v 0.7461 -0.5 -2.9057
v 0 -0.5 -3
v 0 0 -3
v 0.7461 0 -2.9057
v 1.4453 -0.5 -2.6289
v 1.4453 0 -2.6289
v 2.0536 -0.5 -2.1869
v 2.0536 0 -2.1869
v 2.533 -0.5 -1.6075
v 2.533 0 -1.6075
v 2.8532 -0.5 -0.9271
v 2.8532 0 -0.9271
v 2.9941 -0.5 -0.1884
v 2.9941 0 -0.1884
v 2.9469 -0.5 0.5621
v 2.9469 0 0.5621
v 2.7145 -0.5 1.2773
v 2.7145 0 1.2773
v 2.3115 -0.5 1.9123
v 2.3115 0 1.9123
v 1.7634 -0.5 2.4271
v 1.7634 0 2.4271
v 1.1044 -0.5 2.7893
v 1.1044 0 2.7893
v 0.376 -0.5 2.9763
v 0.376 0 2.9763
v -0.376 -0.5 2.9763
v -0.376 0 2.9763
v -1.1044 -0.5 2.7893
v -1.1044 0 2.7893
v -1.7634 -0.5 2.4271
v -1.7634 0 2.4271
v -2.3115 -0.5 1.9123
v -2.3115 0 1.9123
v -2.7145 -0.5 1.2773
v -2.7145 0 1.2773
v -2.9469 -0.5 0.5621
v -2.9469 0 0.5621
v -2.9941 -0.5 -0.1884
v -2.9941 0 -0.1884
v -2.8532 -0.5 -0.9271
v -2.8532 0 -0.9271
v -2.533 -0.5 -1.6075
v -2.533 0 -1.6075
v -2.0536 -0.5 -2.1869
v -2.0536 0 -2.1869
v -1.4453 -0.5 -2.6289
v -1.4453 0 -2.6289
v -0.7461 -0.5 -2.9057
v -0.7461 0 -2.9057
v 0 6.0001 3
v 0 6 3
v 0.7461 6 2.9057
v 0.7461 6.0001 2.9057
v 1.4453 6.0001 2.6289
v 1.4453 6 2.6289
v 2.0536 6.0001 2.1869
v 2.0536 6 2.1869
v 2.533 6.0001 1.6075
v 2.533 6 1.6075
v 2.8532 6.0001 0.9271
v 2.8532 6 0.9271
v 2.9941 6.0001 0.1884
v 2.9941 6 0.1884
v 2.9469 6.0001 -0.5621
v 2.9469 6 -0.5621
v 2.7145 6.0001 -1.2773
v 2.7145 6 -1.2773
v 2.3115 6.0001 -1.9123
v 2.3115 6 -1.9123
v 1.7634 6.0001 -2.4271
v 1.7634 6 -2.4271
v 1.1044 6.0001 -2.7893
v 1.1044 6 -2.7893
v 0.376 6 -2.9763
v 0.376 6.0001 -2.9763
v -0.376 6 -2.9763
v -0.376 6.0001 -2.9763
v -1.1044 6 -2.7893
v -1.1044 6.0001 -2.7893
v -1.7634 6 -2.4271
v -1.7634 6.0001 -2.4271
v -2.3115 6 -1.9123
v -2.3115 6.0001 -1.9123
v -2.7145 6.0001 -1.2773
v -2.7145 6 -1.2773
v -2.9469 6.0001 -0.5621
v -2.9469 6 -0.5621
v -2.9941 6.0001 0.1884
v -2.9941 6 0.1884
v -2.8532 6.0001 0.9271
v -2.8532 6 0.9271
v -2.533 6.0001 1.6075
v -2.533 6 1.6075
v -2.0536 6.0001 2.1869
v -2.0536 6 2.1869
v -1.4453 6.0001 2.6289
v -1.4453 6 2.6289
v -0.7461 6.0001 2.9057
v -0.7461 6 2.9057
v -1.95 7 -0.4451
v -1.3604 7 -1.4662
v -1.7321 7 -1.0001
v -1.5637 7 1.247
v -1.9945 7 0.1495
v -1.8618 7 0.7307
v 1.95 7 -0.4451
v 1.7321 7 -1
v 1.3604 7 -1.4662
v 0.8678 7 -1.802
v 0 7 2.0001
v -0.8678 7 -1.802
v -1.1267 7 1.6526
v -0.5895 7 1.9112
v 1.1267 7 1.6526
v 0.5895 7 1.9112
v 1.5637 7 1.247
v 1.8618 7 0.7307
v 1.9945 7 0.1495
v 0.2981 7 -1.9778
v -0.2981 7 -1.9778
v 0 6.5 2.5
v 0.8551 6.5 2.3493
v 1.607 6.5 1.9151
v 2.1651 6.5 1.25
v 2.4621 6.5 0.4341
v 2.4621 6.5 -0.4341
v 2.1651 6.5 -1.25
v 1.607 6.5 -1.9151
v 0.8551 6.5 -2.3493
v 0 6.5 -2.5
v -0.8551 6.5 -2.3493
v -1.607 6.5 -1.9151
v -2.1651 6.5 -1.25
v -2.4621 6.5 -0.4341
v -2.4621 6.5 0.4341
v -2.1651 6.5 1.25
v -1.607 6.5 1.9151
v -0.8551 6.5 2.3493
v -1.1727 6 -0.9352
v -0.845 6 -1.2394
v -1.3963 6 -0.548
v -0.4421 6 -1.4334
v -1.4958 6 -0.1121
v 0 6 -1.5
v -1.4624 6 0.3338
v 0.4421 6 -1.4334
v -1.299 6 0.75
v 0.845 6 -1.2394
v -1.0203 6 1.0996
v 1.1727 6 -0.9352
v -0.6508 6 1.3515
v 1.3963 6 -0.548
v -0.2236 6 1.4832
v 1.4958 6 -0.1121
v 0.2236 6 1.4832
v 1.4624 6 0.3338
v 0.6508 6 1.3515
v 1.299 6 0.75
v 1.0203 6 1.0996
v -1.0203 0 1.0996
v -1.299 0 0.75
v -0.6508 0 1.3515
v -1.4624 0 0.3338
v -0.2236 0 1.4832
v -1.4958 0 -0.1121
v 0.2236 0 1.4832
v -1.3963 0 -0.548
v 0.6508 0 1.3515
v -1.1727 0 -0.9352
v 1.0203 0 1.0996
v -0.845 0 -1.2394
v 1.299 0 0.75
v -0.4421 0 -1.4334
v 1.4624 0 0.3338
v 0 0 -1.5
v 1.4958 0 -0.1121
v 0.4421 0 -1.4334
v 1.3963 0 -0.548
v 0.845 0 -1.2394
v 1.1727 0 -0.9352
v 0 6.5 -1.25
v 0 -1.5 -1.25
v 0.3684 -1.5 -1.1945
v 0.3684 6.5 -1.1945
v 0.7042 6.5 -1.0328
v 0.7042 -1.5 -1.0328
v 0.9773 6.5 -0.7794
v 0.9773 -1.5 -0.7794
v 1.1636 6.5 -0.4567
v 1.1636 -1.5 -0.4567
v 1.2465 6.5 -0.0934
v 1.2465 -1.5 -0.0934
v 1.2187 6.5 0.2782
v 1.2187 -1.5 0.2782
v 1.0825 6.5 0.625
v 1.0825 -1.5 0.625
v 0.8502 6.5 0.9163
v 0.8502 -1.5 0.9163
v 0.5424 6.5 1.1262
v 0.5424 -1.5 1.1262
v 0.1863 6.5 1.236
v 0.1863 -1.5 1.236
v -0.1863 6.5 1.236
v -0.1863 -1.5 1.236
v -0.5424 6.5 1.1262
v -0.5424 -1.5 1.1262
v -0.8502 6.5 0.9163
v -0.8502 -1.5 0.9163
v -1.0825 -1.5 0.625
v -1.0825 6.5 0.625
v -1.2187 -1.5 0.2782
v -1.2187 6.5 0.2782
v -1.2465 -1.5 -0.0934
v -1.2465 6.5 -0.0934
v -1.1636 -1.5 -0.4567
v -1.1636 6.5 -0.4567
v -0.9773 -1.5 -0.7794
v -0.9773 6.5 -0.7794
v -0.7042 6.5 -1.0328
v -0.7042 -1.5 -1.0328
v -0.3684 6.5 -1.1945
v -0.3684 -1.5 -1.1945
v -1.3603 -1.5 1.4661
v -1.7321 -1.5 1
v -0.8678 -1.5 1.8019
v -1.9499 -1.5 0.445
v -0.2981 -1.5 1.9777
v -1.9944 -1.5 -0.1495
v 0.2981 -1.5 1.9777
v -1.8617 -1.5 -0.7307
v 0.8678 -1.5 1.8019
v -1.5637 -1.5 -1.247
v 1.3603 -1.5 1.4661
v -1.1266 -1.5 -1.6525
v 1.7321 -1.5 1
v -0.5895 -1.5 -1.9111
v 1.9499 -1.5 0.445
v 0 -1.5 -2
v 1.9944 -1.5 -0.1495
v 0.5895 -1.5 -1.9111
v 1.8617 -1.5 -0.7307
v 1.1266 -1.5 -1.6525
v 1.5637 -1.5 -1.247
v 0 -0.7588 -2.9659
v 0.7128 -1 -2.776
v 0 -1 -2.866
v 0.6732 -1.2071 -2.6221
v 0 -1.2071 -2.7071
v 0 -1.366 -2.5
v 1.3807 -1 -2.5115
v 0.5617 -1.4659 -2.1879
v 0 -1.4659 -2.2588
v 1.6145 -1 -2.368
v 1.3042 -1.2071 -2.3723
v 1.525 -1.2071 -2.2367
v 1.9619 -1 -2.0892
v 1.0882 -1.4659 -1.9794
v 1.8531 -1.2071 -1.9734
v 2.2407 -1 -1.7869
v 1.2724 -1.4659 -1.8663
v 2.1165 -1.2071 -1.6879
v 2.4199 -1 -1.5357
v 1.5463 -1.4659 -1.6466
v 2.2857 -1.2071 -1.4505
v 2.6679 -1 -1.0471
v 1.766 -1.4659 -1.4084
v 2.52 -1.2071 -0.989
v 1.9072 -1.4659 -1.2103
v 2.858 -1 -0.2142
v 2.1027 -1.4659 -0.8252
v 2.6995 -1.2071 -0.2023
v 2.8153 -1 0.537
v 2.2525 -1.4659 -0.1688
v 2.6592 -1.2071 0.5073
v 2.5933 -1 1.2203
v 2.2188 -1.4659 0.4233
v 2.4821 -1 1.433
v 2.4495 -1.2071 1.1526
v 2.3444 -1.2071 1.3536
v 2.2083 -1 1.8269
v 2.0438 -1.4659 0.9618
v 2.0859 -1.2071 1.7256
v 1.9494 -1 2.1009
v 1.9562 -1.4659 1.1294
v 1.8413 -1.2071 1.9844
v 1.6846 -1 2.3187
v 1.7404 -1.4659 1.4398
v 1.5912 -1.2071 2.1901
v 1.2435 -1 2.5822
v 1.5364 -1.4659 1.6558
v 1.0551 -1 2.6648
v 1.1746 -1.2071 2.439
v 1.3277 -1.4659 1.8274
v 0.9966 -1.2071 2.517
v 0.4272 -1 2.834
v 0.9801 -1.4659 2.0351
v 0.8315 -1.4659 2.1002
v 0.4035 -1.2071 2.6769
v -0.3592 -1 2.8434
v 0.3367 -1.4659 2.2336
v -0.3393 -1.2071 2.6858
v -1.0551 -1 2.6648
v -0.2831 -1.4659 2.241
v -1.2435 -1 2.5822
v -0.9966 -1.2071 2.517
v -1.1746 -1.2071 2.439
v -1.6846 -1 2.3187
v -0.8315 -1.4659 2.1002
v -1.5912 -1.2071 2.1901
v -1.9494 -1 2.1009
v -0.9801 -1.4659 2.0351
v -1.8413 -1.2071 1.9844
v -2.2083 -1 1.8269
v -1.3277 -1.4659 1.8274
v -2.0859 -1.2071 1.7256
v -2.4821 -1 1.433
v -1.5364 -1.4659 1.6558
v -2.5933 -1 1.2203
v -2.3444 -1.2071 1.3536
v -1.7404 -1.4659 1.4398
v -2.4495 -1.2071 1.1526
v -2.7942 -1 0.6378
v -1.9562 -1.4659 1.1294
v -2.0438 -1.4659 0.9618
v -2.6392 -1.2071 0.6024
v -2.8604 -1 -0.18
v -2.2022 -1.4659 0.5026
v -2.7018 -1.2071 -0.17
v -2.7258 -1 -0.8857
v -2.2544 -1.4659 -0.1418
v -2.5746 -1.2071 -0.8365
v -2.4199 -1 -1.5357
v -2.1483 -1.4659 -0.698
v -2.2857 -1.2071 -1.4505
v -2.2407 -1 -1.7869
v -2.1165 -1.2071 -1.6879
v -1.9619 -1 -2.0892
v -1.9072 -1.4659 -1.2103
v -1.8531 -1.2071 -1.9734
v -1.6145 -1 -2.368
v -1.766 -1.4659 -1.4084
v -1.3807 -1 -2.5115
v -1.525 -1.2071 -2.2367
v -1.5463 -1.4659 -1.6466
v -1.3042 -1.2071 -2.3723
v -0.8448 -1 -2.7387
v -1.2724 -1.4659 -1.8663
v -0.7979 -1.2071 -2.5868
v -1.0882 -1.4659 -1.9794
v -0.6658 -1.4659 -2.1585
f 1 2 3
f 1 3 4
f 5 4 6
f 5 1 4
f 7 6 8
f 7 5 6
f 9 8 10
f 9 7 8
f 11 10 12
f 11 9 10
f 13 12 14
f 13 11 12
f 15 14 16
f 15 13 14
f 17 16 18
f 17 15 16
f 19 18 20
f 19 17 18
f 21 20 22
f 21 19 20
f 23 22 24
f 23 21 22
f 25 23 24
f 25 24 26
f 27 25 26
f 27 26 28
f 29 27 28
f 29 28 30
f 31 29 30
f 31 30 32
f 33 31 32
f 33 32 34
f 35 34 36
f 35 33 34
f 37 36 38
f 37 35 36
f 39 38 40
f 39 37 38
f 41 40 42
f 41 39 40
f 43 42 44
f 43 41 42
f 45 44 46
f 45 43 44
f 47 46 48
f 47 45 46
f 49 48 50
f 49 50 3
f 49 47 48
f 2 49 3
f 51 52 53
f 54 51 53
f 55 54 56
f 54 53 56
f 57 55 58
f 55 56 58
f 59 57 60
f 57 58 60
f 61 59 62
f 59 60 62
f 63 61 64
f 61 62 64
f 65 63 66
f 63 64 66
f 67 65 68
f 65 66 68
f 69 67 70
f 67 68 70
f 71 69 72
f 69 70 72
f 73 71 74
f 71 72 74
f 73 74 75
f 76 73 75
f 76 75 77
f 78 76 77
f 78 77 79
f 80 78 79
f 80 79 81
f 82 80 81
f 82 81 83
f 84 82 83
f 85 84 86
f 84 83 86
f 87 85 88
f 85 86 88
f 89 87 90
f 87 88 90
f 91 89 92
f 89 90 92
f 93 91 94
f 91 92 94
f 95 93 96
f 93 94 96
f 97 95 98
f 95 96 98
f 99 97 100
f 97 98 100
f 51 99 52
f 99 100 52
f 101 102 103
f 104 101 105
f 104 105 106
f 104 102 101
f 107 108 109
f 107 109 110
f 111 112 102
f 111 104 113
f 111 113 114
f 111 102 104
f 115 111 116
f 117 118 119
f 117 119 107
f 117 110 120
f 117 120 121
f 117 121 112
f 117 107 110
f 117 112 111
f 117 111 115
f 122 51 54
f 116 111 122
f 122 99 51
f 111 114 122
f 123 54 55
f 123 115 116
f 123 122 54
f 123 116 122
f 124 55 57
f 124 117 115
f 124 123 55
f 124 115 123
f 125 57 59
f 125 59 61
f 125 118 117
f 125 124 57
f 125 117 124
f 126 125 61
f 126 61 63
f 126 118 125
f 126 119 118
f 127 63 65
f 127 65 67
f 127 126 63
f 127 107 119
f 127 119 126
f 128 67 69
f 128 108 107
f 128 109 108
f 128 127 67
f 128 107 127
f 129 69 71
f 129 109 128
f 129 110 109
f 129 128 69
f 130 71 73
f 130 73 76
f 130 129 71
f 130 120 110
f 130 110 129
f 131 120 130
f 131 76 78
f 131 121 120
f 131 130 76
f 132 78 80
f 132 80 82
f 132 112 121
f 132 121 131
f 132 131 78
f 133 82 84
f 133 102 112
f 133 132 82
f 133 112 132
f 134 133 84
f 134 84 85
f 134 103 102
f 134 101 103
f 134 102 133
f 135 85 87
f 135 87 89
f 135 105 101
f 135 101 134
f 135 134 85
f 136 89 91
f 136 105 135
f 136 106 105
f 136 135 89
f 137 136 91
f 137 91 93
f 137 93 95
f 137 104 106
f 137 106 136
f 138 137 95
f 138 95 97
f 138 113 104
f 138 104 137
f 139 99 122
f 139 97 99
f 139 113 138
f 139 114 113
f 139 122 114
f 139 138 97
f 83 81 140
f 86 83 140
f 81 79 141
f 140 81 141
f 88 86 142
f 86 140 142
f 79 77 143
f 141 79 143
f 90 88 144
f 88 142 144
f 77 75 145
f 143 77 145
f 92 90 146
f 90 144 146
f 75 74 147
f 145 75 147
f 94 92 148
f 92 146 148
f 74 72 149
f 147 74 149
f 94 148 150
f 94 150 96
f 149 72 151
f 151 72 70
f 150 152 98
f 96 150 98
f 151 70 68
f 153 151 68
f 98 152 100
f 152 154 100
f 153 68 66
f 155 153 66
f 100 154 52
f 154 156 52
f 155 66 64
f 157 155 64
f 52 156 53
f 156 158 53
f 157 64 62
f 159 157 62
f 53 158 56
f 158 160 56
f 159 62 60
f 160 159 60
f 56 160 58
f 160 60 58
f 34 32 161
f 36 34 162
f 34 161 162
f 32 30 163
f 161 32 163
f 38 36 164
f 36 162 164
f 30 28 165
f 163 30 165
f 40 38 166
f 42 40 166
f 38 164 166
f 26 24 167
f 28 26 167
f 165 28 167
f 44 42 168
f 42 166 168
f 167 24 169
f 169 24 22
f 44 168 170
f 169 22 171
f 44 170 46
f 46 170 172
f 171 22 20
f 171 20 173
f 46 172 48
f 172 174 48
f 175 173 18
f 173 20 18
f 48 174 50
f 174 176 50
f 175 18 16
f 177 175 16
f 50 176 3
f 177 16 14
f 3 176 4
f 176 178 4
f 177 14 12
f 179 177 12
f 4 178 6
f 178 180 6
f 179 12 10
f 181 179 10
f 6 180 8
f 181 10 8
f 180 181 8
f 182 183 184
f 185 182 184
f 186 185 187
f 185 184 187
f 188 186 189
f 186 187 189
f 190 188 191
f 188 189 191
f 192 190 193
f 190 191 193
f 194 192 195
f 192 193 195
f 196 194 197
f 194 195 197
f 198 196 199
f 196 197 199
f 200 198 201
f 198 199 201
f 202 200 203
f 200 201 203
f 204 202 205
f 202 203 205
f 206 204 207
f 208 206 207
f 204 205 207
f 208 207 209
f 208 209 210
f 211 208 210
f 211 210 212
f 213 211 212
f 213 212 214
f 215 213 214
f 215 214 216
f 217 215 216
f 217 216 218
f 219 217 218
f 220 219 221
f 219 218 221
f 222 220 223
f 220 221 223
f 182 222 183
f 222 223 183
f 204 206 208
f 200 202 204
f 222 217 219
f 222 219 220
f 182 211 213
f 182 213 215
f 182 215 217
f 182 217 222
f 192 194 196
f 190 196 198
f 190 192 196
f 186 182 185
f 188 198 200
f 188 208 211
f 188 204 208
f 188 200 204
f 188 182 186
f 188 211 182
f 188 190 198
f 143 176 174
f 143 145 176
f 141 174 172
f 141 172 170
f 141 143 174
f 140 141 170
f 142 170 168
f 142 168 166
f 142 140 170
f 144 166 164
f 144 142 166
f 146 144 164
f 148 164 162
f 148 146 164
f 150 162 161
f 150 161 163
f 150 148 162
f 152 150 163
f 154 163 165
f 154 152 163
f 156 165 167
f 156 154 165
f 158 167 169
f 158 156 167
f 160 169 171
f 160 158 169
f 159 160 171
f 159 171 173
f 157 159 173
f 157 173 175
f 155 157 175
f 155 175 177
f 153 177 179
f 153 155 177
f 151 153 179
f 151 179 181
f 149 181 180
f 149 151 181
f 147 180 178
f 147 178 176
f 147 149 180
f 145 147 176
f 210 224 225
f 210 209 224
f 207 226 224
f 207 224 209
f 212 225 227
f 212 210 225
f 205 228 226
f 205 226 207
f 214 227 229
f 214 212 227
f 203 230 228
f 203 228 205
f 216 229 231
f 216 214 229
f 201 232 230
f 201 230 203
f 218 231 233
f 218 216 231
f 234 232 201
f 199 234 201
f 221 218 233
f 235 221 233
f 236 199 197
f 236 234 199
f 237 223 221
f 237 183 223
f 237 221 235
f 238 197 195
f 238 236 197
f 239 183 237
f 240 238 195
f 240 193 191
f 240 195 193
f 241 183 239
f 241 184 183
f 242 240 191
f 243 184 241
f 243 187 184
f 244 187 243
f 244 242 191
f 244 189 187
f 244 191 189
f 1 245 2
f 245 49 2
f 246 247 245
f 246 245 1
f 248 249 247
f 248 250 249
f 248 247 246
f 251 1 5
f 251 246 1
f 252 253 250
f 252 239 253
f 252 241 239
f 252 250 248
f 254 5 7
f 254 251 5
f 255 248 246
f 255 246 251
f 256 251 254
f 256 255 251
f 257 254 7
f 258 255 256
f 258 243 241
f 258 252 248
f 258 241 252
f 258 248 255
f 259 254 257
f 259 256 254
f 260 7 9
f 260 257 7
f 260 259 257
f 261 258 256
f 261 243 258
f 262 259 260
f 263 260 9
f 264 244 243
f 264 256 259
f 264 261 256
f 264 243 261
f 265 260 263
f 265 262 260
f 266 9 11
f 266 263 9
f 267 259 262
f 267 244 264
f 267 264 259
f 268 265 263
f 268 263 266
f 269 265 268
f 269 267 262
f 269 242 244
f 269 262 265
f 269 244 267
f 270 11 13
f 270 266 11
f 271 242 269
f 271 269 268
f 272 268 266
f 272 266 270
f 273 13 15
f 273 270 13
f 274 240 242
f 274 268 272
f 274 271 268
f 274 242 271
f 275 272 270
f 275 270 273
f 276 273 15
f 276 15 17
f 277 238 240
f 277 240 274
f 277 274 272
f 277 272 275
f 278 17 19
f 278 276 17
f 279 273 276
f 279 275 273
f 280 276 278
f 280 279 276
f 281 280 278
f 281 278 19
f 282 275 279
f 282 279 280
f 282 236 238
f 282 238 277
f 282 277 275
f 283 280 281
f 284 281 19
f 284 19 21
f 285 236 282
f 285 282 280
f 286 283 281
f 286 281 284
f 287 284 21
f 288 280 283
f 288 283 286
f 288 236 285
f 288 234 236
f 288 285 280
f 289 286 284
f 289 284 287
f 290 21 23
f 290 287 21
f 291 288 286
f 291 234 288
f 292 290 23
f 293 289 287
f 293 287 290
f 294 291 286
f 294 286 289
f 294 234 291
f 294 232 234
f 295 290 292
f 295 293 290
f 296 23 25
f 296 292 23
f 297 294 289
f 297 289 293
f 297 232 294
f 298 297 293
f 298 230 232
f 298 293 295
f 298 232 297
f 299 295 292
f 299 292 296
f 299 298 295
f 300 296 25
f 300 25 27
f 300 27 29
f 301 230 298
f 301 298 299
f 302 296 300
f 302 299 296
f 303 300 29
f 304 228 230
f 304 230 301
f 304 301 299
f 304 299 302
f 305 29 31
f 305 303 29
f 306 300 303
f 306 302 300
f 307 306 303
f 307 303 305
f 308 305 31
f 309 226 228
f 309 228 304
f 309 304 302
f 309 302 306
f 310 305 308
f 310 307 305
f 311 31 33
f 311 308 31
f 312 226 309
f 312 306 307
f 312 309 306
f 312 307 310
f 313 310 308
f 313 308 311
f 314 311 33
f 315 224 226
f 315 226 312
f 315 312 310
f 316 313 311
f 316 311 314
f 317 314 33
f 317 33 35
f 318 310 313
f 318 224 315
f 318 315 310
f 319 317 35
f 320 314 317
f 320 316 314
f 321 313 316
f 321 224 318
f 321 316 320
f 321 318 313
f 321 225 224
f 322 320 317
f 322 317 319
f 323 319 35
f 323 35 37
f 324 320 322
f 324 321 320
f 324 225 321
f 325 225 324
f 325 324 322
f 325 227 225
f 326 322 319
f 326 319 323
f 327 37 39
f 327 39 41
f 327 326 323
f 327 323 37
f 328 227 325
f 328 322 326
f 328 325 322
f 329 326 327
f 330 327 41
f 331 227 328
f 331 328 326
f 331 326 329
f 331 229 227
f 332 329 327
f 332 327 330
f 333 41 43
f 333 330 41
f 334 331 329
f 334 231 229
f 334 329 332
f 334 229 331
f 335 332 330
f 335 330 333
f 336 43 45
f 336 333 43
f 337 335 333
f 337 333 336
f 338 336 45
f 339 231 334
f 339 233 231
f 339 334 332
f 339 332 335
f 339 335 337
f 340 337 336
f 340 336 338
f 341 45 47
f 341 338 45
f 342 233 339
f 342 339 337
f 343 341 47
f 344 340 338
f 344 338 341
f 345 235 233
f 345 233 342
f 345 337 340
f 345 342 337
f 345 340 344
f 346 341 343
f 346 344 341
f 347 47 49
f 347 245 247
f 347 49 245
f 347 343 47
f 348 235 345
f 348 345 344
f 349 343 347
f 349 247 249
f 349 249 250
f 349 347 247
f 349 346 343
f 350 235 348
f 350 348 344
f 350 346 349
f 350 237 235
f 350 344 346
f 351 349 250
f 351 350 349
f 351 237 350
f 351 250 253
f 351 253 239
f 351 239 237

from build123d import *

# Parameters (mm, degrees)
ESQUISSE1_W             = 1.5
ESQUISSE1_H             = 6
ESQUISSE2_R             = 3
BOSS_EXTRU_1_DEPTH      = 1
CHANFREIN1_SIZE         = 1
BOSS_EXTRU_2_START      = 1.5
ESQUISSE3_R             = 3
BOSS_EXTRU_2_DEPTH      = 1.5
CONG_1_R                = 1
ESQUISSE4_R             = 1.25
ENL_V_MAT_EXTRU_1_DEPTH = 8


with BuildPart() as part:
    # Esquisse1 → Révol.-Mince1 (revolve)
    with BuildSketch(Plane.XY, mode=Mode.PRIVATE) as r_vol_mince1_sk:
        with Locations((-0.75, 3)):
            Rectangle(ESQUISSE1_W, ESQUISSE1_H)
    revolve(r_vol_mince1_sk.sketch.rotate(Axis((0, 0, 0), (0, 1, 0)), 270), axis=Axis((0, 0, 0), (0, 1, 0)))

    # Esquisse2 → Boss.-Extru.1 (add)
    with BuildSketch(Plane(origin=(0, 6, 0), x_dir=(1, 0, 0), z_dir=(0, 1, 0))):
        with Locations(Location((0, 0, 0), (0, 0, 270))):
            Circle(ESQUISSE2_R)
    extrude(amount=BOSS_EXTRU_1_DEPTH)

    # Chanfrein1
    chanfrein1_edges = [part.edges().sort_by_distance(p)[0] for p in [
        (0, 7, -3),
    ]]
    chamfer(chanfrein1_edges, length=CHANFREIN1_SIZE - 0.0001)  # a hair under: the kernel refuses the full size

    # Esquisse3 → Boss.-Extru.2 (add)
    with BuildSketch(Plane.XZ.offset(BOSS_EXTRU_2_START)):
        with Locations(Location((0, 0, 0), (0, 0, 270))):
            Circle(ESQUISSE3_R)
    extrude(amount=-BOSS_EXTRU_2_DEPTH)

    # Congé1
    cong_1_edges = [part.edges().sort_by_distance(p)[0] for p in [
        (0, -1.5, 3),
    ]]
    fillet(cong_1_edges, radius=CONG_1_R)

    # Esquisse4 → Enlèv. mat.-Extru.1 (cut)
    with BuildSketch(Plane(origin=(0, -1.5, 0), x_dir=(-1, 0, 0), z_dir=(0, -1, 0))):
        with Locations(Location((0, 0, 0), (0, 0, 90))):
            Circle(ESQUISSE4_R)
    extrude(amount=-ENL_V_MAT_EXTRU_1_DEPTH, mode=Mode.SUBTRACT)


solid = part.part
